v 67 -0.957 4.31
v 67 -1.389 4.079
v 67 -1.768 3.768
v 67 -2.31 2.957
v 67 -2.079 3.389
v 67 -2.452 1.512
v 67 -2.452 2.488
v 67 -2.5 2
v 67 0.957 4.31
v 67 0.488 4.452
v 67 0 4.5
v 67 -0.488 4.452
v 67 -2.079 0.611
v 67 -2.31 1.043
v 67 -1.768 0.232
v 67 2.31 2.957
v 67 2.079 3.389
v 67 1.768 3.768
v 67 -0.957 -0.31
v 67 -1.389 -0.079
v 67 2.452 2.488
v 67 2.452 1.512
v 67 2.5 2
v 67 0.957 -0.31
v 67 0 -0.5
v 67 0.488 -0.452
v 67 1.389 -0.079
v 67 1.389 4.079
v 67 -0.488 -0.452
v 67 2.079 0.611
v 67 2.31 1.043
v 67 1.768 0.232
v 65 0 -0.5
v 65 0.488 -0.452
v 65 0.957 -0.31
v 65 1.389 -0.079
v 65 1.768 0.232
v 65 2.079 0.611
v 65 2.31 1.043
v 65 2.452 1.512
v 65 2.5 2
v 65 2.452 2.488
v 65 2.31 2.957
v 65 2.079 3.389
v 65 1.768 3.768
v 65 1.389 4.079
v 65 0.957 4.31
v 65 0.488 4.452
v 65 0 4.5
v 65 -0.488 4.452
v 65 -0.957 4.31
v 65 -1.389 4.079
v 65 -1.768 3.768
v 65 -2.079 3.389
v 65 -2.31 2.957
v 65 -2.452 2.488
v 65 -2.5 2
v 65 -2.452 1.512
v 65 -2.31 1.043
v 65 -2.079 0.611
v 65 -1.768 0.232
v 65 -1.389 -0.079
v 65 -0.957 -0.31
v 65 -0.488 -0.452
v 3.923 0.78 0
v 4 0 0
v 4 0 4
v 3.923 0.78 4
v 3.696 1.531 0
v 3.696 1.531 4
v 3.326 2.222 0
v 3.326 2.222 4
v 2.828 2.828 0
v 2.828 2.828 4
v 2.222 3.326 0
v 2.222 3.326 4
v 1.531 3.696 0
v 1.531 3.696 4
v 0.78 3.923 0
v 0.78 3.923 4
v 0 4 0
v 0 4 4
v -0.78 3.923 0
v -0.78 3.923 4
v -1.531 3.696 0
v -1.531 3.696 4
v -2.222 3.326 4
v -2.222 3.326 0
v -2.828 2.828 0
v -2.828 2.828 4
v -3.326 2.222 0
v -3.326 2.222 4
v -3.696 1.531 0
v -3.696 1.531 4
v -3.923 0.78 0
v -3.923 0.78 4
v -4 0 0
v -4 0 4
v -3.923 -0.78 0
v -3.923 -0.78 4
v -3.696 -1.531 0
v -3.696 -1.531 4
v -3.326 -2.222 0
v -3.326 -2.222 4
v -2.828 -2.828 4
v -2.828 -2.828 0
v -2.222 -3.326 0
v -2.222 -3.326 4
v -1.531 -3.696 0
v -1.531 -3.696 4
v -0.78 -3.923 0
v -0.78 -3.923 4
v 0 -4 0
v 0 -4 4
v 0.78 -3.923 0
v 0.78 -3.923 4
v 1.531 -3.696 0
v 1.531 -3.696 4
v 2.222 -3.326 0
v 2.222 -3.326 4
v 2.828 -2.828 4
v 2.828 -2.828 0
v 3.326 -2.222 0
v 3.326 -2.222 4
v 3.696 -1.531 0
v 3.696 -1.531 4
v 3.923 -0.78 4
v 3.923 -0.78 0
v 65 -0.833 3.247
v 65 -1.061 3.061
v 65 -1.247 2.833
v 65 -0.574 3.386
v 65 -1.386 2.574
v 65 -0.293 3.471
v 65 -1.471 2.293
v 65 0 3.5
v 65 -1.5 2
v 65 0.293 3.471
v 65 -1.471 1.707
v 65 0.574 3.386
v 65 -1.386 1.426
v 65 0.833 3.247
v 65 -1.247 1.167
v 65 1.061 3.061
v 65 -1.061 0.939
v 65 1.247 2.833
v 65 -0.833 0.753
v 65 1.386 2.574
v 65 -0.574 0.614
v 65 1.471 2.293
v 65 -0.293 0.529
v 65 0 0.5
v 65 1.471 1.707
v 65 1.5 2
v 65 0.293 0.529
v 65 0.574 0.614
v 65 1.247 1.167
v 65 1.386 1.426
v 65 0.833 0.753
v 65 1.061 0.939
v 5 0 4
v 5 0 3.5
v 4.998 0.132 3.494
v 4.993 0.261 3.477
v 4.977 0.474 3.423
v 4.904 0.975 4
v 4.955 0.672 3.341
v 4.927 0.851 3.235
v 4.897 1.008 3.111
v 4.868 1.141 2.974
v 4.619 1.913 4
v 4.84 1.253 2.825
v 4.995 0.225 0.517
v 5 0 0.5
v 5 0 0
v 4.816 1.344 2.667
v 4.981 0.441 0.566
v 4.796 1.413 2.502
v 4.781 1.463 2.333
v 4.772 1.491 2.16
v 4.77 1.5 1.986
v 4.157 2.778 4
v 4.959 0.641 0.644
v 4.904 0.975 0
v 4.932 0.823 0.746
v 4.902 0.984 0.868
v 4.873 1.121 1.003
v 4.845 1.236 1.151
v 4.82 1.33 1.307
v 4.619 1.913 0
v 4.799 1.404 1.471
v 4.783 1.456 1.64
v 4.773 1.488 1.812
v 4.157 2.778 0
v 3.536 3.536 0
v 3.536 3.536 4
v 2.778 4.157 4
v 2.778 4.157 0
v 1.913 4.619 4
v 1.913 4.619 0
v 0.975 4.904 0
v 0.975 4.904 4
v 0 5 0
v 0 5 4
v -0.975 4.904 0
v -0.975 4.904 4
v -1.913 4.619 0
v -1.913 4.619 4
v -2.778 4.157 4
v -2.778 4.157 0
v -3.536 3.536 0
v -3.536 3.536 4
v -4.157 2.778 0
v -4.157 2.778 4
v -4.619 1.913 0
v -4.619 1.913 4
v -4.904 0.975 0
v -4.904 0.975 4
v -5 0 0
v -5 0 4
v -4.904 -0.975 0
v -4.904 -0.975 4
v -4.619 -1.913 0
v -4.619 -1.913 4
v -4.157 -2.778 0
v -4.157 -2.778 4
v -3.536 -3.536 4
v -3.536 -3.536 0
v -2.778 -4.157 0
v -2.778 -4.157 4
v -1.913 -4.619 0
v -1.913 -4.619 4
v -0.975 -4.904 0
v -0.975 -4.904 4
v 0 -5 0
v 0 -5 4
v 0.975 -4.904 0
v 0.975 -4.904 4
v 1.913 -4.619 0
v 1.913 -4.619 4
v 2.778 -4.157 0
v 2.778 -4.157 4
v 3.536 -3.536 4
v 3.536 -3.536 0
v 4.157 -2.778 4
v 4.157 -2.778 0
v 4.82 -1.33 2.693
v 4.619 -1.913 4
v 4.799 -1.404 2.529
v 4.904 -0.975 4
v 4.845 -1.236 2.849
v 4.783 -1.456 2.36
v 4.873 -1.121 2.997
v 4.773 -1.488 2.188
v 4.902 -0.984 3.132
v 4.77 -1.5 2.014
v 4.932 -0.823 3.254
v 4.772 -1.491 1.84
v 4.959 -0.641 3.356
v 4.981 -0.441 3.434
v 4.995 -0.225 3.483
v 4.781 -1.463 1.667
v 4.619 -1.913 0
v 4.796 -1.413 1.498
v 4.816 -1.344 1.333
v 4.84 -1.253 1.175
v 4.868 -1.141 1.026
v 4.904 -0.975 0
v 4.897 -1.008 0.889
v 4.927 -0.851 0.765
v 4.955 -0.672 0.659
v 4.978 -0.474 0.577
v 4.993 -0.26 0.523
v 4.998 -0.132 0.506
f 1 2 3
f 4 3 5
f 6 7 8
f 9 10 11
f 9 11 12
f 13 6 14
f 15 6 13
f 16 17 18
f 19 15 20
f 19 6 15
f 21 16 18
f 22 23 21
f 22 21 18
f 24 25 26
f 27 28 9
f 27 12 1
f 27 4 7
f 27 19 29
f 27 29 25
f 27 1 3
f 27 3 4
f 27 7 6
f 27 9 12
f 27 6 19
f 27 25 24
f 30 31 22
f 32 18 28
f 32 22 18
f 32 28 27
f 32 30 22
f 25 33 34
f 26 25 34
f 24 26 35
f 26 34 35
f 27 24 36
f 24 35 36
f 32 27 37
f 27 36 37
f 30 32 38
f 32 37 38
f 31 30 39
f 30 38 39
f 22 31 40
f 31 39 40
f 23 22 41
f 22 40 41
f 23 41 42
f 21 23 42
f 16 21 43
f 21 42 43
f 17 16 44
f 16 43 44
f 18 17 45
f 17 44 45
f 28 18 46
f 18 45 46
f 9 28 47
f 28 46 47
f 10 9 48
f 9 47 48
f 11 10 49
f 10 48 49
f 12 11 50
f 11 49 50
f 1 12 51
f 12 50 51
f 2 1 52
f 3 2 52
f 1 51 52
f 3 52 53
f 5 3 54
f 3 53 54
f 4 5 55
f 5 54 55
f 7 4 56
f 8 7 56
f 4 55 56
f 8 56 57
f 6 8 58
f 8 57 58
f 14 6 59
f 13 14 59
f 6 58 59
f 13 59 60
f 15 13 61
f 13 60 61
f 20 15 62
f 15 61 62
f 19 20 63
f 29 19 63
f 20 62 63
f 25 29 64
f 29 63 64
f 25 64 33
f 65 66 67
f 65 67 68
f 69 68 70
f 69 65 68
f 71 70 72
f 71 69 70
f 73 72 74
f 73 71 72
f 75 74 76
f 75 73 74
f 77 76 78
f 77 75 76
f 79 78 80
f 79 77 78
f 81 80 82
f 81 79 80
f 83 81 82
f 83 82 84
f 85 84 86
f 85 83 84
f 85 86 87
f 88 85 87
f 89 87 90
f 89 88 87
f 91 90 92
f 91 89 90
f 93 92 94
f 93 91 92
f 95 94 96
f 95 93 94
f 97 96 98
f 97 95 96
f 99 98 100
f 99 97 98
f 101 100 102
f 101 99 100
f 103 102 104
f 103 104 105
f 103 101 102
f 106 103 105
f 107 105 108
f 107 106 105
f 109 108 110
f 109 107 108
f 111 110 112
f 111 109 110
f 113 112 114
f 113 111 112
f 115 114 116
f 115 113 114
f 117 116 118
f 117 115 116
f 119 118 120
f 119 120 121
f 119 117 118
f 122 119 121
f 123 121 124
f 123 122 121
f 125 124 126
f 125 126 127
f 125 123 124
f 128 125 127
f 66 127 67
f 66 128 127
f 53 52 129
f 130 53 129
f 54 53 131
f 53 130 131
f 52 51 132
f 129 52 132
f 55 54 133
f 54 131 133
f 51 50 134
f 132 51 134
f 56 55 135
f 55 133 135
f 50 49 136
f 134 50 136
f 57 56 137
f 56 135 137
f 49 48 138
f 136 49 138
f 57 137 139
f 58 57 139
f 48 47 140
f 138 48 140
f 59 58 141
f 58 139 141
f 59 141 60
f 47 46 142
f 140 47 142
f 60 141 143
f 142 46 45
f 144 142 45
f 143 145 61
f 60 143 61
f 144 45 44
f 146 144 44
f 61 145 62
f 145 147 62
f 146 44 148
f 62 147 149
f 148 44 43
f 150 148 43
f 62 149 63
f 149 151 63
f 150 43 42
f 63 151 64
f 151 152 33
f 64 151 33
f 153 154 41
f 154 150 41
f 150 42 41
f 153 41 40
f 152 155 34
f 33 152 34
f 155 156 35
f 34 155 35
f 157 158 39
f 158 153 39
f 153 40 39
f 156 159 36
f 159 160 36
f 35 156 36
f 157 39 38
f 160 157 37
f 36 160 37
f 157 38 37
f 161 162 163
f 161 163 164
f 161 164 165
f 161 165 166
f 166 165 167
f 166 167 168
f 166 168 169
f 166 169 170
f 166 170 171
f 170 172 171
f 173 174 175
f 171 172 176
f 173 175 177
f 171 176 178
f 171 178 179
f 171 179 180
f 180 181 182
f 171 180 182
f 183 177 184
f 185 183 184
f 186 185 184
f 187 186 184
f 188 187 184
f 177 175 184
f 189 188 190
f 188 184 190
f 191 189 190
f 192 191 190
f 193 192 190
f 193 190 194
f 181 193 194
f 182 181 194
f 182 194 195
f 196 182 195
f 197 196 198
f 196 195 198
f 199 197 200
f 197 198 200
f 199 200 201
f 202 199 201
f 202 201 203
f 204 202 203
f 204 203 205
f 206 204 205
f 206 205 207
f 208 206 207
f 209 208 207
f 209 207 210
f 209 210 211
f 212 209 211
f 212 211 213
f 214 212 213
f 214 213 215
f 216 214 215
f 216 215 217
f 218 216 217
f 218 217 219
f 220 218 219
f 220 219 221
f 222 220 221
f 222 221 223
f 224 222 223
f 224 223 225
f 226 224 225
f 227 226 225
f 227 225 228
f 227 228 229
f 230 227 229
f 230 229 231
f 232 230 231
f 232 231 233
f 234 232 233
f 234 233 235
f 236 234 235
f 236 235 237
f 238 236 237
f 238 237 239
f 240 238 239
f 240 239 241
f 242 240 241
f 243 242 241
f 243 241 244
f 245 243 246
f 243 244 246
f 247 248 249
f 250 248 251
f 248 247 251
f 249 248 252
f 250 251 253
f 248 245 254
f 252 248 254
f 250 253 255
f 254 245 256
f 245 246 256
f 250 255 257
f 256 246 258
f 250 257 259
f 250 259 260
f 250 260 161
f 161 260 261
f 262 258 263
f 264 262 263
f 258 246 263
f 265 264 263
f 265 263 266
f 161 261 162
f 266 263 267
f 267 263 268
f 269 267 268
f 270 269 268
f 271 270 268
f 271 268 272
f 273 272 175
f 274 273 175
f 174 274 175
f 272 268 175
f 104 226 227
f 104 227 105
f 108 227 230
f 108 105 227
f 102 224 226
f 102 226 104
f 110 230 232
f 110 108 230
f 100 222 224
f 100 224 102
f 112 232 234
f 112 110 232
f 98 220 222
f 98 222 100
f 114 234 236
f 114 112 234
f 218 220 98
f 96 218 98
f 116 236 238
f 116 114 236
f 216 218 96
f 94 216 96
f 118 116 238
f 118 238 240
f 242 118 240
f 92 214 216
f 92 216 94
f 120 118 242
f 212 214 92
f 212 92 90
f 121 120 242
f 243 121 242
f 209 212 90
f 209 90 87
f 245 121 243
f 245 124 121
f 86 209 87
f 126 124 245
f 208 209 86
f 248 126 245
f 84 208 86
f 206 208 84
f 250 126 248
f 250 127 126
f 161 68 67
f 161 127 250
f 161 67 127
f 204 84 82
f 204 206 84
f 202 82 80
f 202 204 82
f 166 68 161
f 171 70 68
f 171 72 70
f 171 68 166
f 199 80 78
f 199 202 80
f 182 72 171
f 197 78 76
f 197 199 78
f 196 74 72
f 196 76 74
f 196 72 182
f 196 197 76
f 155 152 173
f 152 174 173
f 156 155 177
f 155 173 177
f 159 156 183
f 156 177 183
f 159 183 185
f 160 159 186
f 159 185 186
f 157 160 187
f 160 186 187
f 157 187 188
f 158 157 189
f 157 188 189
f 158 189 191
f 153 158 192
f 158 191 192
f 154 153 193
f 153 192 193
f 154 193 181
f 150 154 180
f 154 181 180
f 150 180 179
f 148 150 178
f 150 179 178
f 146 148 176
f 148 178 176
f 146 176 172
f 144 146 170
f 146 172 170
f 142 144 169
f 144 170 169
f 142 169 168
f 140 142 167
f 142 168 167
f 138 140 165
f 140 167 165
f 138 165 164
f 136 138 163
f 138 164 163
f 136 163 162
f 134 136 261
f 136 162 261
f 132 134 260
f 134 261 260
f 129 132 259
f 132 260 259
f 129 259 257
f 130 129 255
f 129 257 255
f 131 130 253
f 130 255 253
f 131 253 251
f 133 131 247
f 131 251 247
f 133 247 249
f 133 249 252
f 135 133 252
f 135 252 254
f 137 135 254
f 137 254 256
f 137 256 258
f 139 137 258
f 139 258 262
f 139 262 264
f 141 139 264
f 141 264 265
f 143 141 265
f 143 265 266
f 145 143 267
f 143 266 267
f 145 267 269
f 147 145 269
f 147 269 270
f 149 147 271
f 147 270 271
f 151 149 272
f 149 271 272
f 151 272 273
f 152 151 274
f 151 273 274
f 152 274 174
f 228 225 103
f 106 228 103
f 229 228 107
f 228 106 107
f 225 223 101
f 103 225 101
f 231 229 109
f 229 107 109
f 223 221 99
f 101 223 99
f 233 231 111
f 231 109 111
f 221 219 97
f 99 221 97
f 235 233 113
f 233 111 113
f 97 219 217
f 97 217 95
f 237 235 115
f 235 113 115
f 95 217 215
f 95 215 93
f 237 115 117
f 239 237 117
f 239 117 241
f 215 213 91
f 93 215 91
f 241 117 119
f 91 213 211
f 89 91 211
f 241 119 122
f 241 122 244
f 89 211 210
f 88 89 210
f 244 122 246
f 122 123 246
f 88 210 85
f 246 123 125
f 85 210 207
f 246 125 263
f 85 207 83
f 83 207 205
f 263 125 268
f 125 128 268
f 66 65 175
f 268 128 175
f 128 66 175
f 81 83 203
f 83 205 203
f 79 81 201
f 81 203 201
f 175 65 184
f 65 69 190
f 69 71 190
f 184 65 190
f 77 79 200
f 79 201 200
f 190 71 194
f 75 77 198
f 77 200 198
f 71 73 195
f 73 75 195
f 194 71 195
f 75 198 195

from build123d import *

# Parameters (mm, degrees)
IZIM1_R                                      = 5
IZIM1_R_2                                    = 4
Y_KSEKLIK_EKSTR_ZYON1_DEPTH                  = 4
IZIM2_R                                      = 1.5
Y_KSEKLIK_EKSTR_ZYON2_DEPTH                  = 60
Y_KSEKLIK_EKSTR_ZYON2_DIRECTION_2_REACH      = 13.874
Y_KSEKLIK_EKSTR_ZYON2_DIRECTION_2_END_RADIUS = 5
IZIM3_R                                      = 2.5
Y_KSEKLIK_EKSTR_ZYON3_DEPTH                  = 2


with BuildPart() as part:
    # Çizim1 → Yükseklik-Ekstrüzyon1 (new body)
    with BuildSketch(Plane.XY):
        Circle(IZIM1_R)
        Circle(IZIM1_R_2, mode=Mode.SUBTRACT)
    extrude(amount=Y_KSEKLIK_EKSTR_ZYON1_DEPTH)


with BuildPart() as y_kseklik_ekstr_zyon2_tool:
    # Çizim2 → Yükseklik-Ekstrüzyon2 (new body)
    with BuildSketch(Plane(origin=(5, 0, 0), x_dir=(0, 0, -1), z_dir=(1, 0, 0))):
        with Locations((-2, 0)):
            Circle(IZIM2_R)
    extrude(amount=Y_KSEKLIK_EKSTR_ZYON2_DEPTH)


with BuildPart() as part_1:
    add(part.part)


with BuildPart() as part_2:
    # Yükseklik-Ekstrüzyon2: joined with y_kseklik_ekstr_zyon2_tool
    add(part_1.part.fuse(y_kseklik_ekstr_zyon2_tool.part, tol=0.00001))

    # Yükseklik-Ekstrüzyon2 direction 2: up to this cylinder (the profile starts outside it)
    y_kseklik_ekstr_zyon2_direction_2_end = Plane(origin=(0, 0, 2), z_dir=(0, 0, -1)) * Cylinder(Y_KSEKLIK_EKSTR_ZYON2_DIRECTION_2_END_RADIUS, 38.748, mode=Mode.PRIVATE)
    # Çizim2 → Yükseklik-Ekstrüzyon2 direction 2 (add, up to the surface)
    with BuildSketch(Plane(origin=(5, 0, 0), x_dir=(0, 0, -1), z_dir=(1, 0, 0)), mode=Mode.PRIVATE) as y_kseklik_ekstr_zyon2_direction_2_sk1:
        with Locations((-2, 0)):
            Circle(IZIM2_R)
    y_kseklik_ekstr_zyon2_direction_2_tool1 = extrude(y_kseklik_ekstr_zyon2_direction_2_sk1.sketch, amount=-Y_KSEKLIK_EKSTR_ZYON2_DIRECTION_2_REACH, mode=Mode.PRIVATE) - y_kseklik_ekstr_zyon2_direction_2_end
    add(y_kseklik_ekstr_zyon2_direction_2_tool1.solids().sort_by_distance((5, 0, 2))[0])
    add(y_kseklik_ekstr_zyon2_direction_2_tool1.solids().sort_by_distance((5, 0, 2))[1])

    # Çizim3 → Yükseklik-Ekstrüzyon3 (add)
    with BuildSketch(Plane(origin=(65, 0, 0), x_dir=(0, 0, -1), z_dir=(1, 0, 0))):
        with Locations((-2, 0)):
            Circle(IZIM3_R)
    extrude(amount=Y_KSEKLIK_EKSTR_ZYON3_DEPTH)


solid = part_2.part
